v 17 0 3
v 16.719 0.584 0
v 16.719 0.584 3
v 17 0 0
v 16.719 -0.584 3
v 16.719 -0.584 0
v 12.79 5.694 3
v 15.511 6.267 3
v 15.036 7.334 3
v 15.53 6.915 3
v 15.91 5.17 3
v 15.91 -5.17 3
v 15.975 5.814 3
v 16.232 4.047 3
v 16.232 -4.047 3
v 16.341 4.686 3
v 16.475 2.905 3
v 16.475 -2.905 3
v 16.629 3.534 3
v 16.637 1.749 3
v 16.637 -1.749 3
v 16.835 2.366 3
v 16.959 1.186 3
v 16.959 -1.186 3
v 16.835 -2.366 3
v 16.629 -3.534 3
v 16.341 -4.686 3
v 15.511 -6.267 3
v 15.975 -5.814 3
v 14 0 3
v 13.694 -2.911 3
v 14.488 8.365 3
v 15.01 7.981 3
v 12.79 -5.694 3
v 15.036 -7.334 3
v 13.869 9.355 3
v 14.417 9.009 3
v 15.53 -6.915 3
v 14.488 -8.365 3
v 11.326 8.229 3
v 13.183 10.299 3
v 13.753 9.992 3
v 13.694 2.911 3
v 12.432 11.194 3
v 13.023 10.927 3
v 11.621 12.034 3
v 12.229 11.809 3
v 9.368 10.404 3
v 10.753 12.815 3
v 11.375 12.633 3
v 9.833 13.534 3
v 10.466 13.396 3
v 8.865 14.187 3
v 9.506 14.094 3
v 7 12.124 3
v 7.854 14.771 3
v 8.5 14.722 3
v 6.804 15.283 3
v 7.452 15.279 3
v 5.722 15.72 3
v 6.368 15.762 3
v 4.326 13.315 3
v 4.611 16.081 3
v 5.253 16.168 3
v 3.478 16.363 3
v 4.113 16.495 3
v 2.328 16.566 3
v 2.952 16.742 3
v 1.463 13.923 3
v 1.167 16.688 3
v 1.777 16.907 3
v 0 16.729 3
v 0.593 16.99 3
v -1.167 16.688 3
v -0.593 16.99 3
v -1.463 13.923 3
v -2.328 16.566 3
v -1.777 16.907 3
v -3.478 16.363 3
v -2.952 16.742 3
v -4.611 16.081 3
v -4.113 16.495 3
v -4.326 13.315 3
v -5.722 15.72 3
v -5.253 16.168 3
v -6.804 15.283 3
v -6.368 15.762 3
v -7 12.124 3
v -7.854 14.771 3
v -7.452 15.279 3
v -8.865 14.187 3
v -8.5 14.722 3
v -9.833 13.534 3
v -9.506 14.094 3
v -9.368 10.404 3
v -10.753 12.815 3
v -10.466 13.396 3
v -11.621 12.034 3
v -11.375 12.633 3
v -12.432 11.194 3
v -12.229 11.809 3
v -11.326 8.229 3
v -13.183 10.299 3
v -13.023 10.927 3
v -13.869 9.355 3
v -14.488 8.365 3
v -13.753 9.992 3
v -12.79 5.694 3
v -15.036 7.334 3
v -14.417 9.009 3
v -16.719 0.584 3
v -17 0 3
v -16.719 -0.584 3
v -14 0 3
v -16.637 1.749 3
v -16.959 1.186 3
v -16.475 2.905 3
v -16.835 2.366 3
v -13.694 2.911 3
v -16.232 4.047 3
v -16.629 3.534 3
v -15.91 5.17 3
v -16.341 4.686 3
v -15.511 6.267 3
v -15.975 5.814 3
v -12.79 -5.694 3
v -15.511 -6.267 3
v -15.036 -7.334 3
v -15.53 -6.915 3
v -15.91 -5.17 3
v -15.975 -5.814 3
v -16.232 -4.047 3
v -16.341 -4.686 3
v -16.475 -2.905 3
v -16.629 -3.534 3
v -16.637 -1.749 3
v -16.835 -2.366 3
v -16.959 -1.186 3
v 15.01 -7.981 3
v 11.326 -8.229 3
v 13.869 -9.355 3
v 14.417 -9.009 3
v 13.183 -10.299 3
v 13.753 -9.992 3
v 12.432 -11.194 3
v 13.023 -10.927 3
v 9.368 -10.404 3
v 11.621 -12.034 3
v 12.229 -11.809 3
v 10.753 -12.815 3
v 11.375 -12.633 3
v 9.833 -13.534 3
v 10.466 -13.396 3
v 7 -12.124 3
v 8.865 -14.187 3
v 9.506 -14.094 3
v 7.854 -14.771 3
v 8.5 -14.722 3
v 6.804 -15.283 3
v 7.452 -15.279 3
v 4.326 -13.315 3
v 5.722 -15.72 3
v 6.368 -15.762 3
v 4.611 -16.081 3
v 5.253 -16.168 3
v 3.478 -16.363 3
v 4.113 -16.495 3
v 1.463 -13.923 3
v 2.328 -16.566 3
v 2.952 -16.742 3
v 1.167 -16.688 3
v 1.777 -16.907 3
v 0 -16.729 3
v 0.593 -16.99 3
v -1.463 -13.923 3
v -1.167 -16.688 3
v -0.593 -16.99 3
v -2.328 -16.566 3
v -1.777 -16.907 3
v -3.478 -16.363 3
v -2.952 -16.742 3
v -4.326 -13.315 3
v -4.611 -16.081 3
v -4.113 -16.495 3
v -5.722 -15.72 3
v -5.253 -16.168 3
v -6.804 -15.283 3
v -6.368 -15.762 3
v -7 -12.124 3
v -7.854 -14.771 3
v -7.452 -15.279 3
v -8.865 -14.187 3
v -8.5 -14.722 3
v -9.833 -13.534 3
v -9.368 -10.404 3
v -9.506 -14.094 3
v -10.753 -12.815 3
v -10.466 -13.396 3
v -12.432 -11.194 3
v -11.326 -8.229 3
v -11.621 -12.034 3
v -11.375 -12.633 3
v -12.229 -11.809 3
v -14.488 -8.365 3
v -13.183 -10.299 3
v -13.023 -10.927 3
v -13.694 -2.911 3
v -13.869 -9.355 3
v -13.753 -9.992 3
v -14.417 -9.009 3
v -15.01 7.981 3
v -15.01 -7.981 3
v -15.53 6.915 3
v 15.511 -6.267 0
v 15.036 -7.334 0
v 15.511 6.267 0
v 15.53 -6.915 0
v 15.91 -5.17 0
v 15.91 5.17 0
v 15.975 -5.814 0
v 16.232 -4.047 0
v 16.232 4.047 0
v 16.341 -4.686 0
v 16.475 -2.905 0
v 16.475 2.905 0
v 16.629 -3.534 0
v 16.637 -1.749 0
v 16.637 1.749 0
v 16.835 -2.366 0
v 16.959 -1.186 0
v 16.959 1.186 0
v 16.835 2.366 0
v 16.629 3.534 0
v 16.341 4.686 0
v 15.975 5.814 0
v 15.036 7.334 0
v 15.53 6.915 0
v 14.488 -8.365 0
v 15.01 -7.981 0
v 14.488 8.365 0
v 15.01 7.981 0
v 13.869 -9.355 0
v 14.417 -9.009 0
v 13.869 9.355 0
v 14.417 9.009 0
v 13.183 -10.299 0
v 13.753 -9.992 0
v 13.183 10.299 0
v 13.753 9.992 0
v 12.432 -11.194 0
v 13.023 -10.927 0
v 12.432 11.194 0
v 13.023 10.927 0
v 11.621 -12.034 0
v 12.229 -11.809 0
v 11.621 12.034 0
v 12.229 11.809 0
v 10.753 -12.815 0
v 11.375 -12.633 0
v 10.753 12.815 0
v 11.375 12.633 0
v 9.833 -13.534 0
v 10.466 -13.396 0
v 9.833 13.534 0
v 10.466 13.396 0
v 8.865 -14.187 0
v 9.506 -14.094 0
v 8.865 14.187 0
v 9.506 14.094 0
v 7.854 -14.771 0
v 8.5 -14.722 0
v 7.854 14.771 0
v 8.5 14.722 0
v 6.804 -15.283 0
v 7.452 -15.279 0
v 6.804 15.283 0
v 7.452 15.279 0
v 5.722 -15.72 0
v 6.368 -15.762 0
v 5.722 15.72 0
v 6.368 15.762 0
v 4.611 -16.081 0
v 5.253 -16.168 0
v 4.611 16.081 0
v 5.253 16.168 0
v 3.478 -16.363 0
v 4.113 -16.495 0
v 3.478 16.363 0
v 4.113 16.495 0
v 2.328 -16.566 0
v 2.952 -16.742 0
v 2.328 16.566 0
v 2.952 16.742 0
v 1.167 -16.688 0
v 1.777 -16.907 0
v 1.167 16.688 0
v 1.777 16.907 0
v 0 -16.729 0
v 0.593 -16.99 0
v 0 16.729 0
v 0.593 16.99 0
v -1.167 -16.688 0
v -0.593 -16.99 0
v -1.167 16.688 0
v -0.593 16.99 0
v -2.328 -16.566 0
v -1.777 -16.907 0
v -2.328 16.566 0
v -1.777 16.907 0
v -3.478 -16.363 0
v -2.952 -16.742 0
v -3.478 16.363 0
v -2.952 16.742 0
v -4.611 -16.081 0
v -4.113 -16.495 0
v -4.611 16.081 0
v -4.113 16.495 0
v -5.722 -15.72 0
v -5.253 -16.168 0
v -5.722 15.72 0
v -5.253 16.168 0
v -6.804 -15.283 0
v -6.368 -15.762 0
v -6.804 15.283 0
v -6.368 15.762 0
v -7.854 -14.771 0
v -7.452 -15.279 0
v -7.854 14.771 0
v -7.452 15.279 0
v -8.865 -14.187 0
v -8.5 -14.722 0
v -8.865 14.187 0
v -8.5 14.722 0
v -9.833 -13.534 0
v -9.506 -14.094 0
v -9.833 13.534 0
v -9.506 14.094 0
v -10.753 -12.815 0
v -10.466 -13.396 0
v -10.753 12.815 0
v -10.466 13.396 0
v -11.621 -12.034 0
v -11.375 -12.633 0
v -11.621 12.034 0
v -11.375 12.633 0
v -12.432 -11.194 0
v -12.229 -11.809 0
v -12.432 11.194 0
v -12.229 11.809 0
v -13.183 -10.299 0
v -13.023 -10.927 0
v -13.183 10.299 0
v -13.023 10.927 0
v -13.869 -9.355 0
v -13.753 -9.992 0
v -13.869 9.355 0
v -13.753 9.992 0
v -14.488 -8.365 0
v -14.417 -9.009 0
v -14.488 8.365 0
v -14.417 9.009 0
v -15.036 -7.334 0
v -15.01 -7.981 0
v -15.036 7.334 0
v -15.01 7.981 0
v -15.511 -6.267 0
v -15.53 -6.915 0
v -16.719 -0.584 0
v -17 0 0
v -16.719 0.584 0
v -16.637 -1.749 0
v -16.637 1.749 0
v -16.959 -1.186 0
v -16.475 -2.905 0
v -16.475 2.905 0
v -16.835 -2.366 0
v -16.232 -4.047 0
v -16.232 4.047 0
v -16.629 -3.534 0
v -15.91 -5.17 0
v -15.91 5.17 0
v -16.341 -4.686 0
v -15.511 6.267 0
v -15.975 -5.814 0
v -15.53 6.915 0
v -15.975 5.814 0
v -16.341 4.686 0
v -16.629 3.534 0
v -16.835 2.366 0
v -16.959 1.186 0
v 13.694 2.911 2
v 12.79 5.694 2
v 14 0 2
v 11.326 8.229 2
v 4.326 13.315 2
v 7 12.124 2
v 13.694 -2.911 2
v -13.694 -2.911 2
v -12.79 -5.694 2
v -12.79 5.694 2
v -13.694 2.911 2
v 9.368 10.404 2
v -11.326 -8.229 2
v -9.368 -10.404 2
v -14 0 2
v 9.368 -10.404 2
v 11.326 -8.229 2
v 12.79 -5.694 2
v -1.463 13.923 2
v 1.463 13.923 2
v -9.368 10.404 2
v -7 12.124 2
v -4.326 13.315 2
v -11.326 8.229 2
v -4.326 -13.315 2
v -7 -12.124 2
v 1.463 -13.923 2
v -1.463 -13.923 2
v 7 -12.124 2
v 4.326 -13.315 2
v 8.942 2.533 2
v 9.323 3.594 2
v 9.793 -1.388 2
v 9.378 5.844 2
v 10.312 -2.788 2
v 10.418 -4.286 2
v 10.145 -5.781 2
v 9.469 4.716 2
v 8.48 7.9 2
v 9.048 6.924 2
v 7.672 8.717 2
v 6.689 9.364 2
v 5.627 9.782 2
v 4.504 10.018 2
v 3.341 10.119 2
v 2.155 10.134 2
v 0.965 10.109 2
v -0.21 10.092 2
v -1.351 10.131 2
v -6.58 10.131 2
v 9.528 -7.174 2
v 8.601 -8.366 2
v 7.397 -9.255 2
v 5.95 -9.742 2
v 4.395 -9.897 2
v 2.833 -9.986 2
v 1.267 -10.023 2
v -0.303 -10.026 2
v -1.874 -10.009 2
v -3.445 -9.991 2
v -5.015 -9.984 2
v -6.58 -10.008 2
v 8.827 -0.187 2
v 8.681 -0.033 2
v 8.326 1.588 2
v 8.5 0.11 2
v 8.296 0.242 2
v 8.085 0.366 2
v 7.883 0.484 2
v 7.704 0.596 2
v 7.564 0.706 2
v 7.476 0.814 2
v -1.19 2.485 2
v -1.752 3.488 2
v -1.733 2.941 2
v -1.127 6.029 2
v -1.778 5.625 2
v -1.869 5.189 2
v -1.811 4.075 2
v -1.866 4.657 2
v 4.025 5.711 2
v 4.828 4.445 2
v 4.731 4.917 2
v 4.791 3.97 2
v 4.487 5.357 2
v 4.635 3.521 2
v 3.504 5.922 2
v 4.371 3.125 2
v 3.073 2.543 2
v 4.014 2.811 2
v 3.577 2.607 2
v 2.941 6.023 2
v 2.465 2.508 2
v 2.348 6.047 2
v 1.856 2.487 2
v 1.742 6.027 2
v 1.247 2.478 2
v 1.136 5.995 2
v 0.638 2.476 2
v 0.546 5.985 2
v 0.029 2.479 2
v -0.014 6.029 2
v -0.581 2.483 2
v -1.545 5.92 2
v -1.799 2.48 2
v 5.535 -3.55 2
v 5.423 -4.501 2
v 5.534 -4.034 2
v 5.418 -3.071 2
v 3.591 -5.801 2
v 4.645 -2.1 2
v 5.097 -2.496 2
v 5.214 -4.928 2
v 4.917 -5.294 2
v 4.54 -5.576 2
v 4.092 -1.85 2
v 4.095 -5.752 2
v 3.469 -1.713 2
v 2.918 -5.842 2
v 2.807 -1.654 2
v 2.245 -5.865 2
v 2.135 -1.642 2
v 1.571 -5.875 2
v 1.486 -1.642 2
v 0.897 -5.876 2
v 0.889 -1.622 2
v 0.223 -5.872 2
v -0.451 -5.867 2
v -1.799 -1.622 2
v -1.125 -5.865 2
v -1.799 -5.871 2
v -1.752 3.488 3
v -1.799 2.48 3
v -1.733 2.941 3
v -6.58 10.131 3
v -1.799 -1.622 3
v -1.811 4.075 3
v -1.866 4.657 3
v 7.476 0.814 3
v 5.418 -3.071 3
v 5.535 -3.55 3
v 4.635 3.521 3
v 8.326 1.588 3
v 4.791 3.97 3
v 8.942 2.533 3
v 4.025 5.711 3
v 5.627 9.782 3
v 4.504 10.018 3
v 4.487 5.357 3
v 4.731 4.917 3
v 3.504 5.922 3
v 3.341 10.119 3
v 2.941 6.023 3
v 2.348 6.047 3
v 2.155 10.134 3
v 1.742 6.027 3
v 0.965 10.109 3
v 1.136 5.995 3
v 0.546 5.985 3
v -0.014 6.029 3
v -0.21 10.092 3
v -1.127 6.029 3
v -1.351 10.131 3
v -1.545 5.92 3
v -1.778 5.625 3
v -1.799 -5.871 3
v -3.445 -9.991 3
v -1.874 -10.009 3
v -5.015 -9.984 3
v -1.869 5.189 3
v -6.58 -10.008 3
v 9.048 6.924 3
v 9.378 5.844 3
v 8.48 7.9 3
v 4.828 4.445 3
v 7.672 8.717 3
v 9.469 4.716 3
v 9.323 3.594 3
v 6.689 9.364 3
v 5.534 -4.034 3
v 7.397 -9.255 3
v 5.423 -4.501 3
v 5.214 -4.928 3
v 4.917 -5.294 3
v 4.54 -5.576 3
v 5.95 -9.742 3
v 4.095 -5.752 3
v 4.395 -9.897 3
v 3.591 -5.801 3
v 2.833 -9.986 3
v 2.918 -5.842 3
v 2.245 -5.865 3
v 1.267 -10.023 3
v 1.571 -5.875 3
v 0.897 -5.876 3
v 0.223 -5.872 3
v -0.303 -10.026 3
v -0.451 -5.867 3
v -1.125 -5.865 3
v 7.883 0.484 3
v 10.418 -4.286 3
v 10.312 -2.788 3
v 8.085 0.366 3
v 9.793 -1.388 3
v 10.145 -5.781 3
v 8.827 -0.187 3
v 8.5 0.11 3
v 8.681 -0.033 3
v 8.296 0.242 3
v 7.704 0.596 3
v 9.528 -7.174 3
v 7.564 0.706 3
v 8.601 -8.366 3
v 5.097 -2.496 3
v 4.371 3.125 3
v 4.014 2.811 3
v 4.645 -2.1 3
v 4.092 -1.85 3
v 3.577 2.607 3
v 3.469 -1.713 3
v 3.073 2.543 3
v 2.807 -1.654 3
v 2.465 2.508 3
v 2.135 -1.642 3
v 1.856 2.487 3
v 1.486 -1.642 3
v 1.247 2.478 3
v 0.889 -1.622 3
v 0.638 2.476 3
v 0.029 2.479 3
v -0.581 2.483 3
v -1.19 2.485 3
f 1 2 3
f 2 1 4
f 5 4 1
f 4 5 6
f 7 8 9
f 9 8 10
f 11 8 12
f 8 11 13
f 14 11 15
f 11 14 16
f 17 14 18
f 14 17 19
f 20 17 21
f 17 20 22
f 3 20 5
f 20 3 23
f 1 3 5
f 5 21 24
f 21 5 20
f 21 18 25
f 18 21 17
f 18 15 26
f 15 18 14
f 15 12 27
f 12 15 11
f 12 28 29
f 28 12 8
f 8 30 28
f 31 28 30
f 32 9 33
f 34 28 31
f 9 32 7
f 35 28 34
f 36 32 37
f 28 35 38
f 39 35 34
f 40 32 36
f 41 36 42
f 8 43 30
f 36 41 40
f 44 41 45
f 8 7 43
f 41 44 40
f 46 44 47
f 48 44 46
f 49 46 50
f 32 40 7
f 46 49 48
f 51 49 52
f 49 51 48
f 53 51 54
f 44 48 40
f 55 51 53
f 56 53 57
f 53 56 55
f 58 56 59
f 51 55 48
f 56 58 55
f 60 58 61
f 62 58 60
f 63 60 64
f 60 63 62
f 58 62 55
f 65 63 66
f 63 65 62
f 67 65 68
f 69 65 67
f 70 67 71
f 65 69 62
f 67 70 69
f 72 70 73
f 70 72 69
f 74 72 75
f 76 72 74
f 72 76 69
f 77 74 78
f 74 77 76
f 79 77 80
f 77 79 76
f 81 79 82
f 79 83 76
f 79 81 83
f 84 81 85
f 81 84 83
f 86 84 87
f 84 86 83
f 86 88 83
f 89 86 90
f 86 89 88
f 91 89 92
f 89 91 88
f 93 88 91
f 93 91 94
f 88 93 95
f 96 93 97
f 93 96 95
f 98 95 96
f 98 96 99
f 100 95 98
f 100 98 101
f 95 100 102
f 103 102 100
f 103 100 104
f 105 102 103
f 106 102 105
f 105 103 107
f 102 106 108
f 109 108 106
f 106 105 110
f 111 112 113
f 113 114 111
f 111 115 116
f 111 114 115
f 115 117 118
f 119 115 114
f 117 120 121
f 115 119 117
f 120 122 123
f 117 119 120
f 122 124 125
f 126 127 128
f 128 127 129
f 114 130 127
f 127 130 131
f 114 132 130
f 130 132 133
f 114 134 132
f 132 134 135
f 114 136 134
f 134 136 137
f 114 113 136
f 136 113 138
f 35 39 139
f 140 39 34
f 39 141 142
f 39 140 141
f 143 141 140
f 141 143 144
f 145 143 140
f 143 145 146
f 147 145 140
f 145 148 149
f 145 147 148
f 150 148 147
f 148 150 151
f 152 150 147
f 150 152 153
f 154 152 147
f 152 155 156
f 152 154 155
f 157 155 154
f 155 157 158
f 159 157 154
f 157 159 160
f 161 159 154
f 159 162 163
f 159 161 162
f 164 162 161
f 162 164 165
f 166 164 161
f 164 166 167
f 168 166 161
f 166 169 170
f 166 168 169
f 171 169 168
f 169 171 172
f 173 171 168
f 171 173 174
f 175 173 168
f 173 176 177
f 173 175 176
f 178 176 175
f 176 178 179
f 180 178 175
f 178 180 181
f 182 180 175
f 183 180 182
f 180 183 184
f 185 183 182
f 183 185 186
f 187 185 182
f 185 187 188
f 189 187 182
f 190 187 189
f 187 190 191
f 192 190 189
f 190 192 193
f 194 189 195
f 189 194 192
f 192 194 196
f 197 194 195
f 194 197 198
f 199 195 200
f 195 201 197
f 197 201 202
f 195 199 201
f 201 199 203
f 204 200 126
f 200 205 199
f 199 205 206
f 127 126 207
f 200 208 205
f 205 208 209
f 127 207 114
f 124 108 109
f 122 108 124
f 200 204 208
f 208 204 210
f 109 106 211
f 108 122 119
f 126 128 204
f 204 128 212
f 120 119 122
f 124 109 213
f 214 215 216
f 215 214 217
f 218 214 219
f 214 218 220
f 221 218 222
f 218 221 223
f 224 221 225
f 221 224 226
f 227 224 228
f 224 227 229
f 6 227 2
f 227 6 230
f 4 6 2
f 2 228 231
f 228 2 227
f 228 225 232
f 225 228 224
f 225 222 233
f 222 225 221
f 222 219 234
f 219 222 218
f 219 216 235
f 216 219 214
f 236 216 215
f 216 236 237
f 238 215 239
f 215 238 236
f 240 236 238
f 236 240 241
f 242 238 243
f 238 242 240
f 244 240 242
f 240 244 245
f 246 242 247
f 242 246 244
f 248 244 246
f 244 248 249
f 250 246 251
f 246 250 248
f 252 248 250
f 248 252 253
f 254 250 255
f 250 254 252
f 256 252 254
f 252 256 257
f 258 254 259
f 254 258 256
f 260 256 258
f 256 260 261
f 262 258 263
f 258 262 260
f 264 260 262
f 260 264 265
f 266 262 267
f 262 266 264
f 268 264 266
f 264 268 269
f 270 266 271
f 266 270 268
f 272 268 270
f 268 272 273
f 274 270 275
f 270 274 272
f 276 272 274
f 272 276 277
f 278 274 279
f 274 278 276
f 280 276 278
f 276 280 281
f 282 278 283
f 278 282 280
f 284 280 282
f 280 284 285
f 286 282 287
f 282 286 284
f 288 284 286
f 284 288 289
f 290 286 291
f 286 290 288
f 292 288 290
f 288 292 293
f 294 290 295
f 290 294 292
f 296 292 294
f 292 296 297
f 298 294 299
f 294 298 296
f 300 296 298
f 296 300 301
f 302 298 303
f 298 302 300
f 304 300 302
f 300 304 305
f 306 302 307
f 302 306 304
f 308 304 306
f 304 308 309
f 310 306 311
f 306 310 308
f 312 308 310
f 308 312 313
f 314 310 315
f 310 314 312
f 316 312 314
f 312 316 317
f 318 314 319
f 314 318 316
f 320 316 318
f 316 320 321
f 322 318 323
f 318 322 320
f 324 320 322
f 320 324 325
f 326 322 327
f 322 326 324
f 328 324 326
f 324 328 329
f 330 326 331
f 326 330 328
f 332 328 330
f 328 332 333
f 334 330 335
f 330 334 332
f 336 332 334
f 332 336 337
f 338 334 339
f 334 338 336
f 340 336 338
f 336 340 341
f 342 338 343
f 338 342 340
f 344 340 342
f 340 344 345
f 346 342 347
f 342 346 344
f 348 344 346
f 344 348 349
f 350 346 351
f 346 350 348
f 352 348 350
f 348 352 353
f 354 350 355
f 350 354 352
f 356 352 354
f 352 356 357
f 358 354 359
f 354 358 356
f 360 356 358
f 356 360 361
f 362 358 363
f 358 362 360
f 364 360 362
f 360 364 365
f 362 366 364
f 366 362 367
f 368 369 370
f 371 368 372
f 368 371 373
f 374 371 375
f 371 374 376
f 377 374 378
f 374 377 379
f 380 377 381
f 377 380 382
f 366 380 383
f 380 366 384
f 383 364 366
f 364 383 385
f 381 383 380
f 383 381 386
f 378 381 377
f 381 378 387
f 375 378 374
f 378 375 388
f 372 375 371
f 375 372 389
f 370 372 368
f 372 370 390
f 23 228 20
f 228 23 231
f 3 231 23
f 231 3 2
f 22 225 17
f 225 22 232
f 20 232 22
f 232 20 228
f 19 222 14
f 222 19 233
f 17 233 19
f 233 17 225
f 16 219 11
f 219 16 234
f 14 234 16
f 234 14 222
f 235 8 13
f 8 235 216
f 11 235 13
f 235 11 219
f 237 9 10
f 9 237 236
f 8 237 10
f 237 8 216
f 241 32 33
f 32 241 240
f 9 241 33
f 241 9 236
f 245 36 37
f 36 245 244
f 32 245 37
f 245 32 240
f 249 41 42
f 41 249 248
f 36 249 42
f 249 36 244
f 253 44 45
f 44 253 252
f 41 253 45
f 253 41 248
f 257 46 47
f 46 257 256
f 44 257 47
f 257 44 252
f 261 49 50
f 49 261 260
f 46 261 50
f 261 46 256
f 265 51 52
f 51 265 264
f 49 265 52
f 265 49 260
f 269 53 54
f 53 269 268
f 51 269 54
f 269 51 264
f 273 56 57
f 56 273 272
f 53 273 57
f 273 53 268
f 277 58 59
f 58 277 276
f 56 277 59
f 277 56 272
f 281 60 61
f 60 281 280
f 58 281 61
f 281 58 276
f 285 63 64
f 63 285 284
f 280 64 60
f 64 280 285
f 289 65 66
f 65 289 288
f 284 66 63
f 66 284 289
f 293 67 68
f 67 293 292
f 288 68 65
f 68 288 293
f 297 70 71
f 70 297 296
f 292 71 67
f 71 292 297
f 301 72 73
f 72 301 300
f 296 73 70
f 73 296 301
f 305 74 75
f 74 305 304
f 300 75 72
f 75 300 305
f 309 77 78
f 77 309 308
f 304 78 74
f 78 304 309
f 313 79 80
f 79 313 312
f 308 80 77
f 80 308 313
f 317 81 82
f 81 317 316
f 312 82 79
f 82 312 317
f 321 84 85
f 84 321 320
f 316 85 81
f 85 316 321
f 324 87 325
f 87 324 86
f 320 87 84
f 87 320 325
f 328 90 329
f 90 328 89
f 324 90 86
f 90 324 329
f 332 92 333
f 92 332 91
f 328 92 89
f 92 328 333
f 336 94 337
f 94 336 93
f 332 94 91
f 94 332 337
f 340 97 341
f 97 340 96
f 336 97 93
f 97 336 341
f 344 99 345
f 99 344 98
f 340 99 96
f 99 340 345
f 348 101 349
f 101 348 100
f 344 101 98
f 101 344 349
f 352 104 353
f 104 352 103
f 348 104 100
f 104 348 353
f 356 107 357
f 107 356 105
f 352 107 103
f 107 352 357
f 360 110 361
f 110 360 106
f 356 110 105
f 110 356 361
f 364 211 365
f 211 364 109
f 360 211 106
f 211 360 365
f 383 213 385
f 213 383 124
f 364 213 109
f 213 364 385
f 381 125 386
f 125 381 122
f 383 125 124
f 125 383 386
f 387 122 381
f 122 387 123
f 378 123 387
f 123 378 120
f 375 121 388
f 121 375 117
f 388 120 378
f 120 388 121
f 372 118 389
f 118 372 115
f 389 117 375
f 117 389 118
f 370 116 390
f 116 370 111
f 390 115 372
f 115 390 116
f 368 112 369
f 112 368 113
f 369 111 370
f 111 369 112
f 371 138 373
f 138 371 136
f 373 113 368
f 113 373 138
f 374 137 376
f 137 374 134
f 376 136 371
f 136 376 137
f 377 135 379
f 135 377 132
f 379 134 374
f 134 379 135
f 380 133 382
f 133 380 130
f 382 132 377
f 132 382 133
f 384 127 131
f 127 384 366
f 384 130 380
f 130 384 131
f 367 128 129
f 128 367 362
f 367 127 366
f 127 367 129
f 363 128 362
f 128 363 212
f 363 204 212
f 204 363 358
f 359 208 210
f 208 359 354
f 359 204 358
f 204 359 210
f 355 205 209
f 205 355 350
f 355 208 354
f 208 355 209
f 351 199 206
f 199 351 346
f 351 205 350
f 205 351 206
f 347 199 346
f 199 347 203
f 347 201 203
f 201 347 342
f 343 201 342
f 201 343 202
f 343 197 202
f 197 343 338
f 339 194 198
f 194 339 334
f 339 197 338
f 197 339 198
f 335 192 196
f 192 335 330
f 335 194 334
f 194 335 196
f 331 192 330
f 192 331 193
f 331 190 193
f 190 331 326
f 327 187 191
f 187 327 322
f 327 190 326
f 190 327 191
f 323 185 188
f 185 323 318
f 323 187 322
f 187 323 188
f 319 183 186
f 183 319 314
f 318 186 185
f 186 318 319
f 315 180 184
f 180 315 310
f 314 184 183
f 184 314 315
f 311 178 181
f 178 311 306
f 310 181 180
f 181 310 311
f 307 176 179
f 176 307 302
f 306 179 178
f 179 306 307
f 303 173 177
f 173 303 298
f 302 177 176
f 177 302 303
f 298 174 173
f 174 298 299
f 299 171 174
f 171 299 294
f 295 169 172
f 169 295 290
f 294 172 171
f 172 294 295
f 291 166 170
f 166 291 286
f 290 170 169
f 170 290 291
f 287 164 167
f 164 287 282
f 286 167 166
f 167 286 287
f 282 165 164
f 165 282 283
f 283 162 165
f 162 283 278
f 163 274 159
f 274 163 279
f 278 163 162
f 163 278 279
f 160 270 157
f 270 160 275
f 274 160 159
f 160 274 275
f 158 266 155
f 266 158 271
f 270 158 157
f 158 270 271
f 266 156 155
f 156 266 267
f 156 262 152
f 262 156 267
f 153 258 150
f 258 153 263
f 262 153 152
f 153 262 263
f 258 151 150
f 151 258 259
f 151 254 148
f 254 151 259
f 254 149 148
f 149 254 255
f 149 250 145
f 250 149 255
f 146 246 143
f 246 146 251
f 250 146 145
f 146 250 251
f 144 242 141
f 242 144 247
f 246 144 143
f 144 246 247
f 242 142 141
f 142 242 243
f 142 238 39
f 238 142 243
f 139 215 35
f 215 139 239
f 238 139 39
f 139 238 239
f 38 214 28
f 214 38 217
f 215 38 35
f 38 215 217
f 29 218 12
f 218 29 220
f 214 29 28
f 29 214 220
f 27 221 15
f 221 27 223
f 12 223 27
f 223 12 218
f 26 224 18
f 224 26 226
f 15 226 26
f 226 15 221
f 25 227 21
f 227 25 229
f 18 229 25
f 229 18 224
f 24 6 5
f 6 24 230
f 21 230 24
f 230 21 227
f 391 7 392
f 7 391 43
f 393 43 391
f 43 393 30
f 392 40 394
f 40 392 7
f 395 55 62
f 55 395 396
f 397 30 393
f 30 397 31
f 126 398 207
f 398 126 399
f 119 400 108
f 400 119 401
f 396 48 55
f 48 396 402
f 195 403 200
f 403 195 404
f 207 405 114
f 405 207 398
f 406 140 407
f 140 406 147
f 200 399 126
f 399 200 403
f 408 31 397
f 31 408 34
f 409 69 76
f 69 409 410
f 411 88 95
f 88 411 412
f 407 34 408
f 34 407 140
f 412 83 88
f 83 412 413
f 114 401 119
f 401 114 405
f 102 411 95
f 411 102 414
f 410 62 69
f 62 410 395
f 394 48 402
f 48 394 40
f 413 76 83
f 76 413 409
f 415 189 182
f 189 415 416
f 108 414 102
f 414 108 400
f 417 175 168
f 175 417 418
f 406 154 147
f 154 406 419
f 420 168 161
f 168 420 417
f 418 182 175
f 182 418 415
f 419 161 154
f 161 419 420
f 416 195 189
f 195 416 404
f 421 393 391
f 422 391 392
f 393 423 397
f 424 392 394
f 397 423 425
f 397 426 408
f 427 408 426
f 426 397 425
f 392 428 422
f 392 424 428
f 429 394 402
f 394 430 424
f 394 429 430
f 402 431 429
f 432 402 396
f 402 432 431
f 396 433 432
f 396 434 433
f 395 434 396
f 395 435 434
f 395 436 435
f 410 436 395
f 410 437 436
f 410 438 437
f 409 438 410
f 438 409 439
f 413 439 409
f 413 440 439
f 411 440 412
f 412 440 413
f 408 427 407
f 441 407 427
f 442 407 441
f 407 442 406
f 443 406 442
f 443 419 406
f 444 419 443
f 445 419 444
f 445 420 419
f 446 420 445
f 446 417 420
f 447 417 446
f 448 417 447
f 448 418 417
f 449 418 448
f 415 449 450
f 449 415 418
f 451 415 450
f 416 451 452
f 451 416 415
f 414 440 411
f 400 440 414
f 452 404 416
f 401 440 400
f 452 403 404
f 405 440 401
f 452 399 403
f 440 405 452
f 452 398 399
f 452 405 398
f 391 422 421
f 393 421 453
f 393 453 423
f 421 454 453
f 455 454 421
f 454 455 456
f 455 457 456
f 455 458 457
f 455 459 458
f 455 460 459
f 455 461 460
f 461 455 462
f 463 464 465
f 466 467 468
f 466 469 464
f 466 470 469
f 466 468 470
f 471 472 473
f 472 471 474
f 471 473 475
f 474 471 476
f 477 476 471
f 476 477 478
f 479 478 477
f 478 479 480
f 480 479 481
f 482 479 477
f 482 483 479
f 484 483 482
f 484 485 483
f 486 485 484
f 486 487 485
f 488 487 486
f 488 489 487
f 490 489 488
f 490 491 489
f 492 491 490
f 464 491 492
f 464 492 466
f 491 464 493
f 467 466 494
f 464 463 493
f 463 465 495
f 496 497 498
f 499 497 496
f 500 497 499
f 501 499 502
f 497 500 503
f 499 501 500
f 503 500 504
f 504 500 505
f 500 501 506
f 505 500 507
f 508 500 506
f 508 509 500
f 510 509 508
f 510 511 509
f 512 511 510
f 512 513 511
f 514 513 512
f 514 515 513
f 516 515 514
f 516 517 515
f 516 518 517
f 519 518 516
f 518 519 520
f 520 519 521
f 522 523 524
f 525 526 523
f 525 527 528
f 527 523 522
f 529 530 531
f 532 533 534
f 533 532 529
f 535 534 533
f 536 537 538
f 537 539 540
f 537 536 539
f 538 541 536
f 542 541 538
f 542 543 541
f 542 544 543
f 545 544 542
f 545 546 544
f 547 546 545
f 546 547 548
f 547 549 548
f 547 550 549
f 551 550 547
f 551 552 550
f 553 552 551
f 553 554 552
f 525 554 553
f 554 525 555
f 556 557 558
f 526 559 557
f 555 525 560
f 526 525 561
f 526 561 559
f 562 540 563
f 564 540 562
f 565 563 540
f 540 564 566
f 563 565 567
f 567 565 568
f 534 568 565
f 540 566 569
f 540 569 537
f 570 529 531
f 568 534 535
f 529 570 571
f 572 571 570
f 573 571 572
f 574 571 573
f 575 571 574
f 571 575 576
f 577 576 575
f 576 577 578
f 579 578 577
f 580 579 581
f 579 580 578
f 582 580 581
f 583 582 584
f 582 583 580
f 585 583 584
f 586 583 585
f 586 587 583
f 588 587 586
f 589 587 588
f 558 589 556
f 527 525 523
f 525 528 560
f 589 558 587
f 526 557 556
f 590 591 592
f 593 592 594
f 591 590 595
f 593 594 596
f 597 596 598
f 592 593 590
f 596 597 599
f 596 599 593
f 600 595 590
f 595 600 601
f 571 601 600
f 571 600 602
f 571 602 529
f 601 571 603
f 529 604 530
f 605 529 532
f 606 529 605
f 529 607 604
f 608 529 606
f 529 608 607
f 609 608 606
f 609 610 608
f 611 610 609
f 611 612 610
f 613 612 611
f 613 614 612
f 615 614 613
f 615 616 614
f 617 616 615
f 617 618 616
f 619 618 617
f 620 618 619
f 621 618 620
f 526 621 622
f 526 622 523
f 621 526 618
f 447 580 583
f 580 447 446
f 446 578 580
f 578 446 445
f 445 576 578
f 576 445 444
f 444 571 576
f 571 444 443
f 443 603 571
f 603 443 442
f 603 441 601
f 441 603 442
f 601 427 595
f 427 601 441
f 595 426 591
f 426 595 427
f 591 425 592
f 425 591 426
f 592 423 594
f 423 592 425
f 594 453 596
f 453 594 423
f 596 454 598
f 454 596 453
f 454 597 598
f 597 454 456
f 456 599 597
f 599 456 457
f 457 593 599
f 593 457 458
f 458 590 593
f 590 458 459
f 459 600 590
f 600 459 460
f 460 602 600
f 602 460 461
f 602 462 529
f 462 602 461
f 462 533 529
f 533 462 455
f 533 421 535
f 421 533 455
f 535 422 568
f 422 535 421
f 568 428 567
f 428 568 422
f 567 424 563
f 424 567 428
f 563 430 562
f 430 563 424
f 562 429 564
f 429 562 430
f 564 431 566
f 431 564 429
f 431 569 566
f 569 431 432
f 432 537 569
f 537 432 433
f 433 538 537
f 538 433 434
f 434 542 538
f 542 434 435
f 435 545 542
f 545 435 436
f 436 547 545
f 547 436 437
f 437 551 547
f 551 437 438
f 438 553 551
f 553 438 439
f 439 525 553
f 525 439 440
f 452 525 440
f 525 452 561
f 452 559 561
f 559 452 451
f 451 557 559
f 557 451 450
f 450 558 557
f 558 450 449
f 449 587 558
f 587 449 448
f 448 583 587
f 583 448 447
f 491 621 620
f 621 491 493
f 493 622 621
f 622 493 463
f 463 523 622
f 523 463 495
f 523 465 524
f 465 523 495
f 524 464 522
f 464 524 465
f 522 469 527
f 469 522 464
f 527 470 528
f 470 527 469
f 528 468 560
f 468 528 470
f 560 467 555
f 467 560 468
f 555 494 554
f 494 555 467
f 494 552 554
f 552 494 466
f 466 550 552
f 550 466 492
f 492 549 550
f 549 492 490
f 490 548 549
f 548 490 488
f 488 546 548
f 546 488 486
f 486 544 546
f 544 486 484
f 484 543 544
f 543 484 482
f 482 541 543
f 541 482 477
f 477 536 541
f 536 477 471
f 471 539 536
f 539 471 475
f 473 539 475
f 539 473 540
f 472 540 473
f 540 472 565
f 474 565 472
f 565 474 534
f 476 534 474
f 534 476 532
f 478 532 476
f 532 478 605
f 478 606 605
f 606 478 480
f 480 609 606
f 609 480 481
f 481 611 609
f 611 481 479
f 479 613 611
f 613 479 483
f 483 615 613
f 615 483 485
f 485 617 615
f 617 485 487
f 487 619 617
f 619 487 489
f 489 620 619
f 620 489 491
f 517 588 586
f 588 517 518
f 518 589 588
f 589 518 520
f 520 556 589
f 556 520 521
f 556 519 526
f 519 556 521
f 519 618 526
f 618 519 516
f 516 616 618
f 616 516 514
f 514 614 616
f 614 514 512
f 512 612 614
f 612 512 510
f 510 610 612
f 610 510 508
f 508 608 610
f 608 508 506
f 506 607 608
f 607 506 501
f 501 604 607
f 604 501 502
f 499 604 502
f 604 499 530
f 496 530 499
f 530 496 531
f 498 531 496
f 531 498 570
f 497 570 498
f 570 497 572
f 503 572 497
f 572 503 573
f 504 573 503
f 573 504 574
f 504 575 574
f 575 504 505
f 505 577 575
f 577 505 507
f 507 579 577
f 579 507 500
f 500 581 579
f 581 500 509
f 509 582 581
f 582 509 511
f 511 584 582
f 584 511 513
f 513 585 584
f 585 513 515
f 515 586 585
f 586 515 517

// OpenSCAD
// file: coin-lib.scad
/*
 * Simple coin shape
 *
 * Copyright (c) 2012 Mark Hindess
 *
 * Creative Commons Attribution-NonCommercial-ShareAlike 3.0 Unported License:
 *
 *   http://creativecommons.org/licenses/by-nc-sa/3.0/
 */

module coin(height = 3, radius = 17,
            cut_radius = 14, cut_height = 1,
            bumps = 90, bump_radius = 2) {
  deg = 360/bumps;
  difference() {
    union() {
      for(n=[0:bumps-1]) {
        rotate([0, 0, n*deg])
          translate([radius-bump_radius, 0, 0])
            cylinder(r = bump_radius, h = height);
      }
      cylinder(r = radius-bump_radius, h = height);
    }
    translate([0, 0, height-cut_height])
      cylinder(r = cut_radius, h = height-cut_height);
  }
}

coin();
// main file
use <coin-lib.scad>
coin();
translate([-10.5, -12, 2])
  scale([0.28, 0.28, 1])
    linear_extrude(file = "b.dxf", height = 2, center = true);
